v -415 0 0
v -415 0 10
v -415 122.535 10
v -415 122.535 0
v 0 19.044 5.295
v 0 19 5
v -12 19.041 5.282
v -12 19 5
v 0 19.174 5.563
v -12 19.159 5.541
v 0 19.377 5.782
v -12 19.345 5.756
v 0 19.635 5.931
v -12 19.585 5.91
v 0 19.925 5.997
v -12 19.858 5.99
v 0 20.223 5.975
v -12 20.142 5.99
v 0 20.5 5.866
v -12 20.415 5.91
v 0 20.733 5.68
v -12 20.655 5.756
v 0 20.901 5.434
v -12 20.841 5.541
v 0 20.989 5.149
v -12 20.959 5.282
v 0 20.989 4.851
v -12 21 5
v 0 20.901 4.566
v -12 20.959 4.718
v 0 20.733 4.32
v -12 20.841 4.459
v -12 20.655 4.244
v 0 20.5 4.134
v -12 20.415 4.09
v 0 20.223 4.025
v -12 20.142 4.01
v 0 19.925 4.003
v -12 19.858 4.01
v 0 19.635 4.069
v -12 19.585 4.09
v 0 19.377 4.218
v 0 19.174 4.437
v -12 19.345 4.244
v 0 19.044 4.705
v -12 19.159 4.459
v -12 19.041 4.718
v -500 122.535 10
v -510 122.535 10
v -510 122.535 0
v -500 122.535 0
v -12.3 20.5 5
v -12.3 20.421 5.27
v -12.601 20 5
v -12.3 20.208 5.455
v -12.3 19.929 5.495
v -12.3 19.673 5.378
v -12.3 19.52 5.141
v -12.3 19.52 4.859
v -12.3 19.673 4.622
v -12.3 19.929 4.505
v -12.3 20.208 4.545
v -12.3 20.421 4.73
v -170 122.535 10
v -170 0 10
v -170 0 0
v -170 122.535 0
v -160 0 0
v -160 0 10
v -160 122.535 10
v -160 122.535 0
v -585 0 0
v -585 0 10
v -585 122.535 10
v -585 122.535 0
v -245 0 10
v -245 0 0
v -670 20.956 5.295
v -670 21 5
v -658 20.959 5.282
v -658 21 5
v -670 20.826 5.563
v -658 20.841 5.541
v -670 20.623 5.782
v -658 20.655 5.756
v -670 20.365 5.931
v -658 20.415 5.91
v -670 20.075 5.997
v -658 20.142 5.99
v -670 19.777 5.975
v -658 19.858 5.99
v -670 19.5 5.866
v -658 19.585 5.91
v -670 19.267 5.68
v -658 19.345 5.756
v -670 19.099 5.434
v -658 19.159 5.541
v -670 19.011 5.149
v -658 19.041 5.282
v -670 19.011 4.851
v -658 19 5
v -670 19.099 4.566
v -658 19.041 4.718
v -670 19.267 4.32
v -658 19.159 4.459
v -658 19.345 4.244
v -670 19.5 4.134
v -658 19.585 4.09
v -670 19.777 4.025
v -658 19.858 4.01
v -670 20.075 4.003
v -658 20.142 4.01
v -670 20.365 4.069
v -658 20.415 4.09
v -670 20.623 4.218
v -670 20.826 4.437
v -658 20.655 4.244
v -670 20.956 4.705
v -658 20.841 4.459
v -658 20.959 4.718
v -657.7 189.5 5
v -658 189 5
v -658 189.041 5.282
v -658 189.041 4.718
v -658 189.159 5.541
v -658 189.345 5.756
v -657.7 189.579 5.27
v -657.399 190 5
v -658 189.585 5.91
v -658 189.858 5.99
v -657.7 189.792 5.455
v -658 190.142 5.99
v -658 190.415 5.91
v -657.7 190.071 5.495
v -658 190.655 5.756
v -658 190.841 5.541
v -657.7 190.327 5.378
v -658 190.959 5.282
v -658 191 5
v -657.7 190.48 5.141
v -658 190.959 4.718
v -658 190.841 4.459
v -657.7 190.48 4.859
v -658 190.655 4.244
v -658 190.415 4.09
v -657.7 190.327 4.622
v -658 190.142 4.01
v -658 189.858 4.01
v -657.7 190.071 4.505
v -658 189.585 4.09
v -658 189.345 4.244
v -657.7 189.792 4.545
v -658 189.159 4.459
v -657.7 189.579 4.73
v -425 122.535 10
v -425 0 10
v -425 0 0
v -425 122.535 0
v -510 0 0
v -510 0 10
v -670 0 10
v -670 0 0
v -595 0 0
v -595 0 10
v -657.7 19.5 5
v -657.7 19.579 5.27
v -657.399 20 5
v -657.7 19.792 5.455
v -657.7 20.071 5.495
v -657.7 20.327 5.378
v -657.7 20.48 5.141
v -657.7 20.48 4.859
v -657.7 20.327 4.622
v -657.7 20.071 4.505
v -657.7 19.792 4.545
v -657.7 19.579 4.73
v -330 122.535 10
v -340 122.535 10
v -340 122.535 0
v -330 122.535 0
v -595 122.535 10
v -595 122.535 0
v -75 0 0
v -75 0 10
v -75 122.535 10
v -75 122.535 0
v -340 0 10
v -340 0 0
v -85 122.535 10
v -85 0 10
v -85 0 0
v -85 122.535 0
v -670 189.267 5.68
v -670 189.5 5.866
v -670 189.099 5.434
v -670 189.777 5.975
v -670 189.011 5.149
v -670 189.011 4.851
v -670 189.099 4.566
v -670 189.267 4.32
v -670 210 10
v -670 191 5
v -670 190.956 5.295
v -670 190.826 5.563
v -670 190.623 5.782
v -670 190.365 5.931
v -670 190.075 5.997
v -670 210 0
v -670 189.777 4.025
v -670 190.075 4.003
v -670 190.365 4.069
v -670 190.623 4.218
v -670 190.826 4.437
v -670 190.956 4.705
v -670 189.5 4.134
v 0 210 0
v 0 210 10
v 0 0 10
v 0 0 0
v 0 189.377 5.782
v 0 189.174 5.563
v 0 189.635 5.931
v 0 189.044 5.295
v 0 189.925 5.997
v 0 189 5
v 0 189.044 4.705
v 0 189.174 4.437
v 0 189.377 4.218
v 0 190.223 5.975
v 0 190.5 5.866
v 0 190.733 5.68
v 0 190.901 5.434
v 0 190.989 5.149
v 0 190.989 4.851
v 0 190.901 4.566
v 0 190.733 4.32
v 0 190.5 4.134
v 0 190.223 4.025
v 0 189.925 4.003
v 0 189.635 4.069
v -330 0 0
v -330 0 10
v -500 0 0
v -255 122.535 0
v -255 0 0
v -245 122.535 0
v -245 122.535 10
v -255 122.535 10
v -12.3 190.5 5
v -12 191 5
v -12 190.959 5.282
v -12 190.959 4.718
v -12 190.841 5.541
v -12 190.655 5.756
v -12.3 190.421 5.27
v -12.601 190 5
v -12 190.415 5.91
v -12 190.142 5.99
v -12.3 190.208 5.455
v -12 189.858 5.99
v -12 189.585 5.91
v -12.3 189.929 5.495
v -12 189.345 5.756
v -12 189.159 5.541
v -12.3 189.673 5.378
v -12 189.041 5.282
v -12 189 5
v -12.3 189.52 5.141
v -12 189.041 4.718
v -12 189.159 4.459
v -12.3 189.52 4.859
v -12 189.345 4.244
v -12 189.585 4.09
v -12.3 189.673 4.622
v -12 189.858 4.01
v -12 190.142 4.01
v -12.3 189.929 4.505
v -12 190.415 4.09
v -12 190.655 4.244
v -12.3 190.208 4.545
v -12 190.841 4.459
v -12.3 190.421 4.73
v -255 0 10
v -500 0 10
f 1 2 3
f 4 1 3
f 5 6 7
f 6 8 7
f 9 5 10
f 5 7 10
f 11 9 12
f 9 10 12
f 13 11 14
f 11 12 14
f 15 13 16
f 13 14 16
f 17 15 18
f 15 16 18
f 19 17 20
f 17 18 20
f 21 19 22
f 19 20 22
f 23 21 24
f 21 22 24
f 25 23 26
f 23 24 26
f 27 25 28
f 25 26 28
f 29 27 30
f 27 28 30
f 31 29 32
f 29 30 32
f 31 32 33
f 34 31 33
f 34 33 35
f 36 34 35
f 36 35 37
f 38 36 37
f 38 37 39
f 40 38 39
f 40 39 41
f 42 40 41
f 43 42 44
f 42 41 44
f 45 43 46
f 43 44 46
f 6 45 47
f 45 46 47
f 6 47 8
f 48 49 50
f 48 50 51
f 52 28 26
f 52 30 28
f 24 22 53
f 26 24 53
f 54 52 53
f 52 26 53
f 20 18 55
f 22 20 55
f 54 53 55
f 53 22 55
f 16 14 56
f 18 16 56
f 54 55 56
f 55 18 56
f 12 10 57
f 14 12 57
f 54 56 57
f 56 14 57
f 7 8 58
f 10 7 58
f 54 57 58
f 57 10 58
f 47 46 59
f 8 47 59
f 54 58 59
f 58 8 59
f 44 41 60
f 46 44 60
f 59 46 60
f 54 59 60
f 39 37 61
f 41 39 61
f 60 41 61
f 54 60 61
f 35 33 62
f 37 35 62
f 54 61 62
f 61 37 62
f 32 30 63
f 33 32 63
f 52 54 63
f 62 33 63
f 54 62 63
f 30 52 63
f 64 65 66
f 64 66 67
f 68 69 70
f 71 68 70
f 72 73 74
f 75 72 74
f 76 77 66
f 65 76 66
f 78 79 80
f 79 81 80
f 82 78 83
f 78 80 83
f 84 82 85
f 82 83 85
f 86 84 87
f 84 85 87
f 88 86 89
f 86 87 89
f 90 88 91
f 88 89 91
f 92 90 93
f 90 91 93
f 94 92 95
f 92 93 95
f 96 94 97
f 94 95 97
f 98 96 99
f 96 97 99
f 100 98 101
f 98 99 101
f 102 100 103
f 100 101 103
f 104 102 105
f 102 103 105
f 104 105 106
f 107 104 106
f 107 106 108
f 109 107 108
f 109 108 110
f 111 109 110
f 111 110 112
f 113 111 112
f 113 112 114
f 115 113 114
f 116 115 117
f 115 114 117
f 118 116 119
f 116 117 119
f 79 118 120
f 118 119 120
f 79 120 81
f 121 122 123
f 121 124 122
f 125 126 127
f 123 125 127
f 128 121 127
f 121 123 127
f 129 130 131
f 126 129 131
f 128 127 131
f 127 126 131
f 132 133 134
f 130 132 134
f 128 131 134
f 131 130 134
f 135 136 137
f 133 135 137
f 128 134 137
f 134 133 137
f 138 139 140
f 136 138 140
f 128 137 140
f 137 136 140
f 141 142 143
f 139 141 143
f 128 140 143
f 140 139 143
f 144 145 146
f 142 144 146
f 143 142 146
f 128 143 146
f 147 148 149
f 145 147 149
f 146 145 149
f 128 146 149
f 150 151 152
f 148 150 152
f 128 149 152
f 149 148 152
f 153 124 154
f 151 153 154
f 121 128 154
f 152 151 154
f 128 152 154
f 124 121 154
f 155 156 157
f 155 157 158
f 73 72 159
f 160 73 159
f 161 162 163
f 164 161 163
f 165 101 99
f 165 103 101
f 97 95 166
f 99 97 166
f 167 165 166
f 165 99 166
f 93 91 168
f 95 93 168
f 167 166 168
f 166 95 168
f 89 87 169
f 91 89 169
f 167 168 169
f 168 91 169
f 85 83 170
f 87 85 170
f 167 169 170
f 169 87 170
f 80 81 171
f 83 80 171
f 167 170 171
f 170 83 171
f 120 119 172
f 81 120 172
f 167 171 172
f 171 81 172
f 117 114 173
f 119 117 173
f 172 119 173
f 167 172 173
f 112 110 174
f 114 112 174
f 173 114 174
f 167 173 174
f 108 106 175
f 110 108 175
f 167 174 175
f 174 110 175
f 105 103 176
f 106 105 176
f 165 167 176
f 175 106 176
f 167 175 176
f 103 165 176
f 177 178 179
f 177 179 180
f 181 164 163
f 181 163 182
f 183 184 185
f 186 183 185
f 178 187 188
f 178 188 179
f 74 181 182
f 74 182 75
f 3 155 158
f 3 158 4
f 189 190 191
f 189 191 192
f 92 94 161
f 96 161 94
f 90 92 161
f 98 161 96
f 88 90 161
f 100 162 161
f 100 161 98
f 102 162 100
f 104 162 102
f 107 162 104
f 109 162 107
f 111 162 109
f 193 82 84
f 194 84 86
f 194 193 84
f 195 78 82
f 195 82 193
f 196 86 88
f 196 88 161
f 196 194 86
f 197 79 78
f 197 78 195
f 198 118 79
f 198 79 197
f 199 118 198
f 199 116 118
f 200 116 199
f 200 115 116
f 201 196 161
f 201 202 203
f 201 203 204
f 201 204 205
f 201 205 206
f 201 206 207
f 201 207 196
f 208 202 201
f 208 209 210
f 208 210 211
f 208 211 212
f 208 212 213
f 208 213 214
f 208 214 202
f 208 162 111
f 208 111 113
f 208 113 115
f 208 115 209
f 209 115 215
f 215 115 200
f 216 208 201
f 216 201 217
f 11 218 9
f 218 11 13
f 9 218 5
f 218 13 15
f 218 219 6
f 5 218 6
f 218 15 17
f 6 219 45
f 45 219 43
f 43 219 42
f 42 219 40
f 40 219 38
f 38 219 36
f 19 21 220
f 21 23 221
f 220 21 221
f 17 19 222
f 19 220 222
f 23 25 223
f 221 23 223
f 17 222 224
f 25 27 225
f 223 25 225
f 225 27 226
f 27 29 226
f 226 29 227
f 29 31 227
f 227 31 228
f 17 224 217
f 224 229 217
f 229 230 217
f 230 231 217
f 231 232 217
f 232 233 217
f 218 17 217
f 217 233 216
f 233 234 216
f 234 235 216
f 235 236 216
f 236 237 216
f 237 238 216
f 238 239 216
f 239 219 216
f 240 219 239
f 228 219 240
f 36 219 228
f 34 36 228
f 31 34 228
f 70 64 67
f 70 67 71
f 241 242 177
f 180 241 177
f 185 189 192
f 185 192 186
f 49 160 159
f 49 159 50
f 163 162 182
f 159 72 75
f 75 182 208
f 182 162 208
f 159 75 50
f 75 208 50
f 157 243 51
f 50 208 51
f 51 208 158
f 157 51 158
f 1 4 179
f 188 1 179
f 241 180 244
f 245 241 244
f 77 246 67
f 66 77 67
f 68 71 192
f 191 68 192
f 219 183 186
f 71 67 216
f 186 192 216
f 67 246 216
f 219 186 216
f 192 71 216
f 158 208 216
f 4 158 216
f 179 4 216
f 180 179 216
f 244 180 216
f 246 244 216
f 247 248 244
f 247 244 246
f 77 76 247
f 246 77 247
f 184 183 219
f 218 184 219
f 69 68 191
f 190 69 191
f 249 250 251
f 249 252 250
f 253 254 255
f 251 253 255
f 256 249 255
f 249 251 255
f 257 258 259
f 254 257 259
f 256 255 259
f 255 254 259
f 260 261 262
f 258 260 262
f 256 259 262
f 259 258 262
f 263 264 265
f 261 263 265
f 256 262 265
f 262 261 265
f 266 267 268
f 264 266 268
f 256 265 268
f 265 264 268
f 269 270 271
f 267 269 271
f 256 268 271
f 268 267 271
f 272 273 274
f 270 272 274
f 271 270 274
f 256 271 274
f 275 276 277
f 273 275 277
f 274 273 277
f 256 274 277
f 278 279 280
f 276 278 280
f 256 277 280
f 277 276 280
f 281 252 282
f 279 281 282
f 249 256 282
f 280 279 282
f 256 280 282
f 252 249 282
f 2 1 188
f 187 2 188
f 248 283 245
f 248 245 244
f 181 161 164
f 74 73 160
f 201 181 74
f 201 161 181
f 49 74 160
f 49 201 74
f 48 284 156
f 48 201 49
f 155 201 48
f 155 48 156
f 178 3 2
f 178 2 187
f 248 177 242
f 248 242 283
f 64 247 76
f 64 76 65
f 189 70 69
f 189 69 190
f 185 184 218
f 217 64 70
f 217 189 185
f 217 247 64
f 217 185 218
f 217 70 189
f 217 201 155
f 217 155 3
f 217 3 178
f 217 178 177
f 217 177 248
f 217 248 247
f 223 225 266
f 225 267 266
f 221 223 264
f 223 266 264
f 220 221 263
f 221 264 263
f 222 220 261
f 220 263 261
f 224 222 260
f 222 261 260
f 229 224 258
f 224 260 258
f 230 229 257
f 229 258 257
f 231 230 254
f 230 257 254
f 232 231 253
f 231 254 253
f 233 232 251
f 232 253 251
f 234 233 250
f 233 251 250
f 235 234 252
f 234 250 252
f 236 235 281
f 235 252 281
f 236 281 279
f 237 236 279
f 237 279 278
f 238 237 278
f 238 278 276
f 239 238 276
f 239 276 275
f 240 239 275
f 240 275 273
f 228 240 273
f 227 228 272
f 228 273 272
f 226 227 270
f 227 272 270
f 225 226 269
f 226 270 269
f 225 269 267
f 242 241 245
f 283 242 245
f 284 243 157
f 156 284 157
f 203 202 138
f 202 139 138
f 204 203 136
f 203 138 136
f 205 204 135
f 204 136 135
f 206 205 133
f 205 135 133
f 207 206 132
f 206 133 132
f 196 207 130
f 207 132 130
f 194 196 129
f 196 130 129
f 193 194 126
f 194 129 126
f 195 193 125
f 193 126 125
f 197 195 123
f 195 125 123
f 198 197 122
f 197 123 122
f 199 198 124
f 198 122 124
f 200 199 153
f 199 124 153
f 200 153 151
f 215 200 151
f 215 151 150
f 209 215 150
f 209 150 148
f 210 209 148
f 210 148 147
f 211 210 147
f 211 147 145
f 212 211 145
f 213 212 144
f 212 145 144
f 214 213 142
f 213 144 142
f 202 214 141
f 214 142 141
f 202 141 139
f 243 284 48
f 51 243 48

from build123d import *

# Parameters (mm, degrees)
F0_W     = 670
F0_H     = 210
F1_DEPTH = 10
F2_W     = 10
F2_H     = 122.5349456072
F3_DEPTH = 25
F5_D     = 2
F5_DEPTH = 12
F5_TIP   = 0.600860619
F7_D     = 2
F7_DEPTH = 12
F7_TIP   = 0.600860619


with BuildPart() as f1:
    # F0 (on Top) → F1 (new body)
    with BuildSketch(Plane.XY):
        with Locations((-335, 105)):
            Rectangle(F0_W, F0_H)
    extrude(amount=F1_DEPTH)

    # F2 (on face) → F3 (cut)
    with BuildSketch(Plane.XY.offset(10)):
        with Locations((-590, 61.2674728036)):
            Rectangle(F2_W, F2_H)
        with Locations((-505, 61.2674728036)):
            Rectangle(F2_W, F2_H)
        with Locations((-420, 61.2674728036)):
            Rectangle(F2_W, F2_H)
        with Locations((-335, 61.2674728036)):
            Rectangle(F2_W, F2_H)
        with Locations((-250, 61.2674728036)):
            Rectangle(F2_W, F2_H)
        with Locations((-165, 61.2674728036)):
            Rectangle(F2_W, F2_H)
        with Locations((-80, 61.2674728036)):
            Rectangle(F2_W, F2_H)
    extrude(amount=-F3_DEPTH, mode=Mode.SUBTRACT)

    # F5
    with Locations(Plane(origin=(-670, 0, 0), x_dir=(0, -1, 0), z_dir=(-1, 0, 0))):
        with Locations((-190, 5), (-20, 5)):
            Hole(F5_D / 2, depth=F5_DEPTH)
            with Locations((0, 0, -(F5_DEPTH + F5_TIP / 2))):  # 118° drill point
                Cone(0, F5_D / 2, F5_TIP, mode=Mode.SUBTRACT)

    # F7
    with Locations(Plane.YZ):
        with Locations((20, 5), (190, 5)):
            Hole(F7_D / 2, depth=F7_DEPTH)
            with Locations((0, 0, -(F7_DEPTH + F7_TIP / 2))):  # 118° drill point
                Cone(0, F7_D / 2, F7_TIP, mode=Mode.SUBTRACT)


solid = f1.part
